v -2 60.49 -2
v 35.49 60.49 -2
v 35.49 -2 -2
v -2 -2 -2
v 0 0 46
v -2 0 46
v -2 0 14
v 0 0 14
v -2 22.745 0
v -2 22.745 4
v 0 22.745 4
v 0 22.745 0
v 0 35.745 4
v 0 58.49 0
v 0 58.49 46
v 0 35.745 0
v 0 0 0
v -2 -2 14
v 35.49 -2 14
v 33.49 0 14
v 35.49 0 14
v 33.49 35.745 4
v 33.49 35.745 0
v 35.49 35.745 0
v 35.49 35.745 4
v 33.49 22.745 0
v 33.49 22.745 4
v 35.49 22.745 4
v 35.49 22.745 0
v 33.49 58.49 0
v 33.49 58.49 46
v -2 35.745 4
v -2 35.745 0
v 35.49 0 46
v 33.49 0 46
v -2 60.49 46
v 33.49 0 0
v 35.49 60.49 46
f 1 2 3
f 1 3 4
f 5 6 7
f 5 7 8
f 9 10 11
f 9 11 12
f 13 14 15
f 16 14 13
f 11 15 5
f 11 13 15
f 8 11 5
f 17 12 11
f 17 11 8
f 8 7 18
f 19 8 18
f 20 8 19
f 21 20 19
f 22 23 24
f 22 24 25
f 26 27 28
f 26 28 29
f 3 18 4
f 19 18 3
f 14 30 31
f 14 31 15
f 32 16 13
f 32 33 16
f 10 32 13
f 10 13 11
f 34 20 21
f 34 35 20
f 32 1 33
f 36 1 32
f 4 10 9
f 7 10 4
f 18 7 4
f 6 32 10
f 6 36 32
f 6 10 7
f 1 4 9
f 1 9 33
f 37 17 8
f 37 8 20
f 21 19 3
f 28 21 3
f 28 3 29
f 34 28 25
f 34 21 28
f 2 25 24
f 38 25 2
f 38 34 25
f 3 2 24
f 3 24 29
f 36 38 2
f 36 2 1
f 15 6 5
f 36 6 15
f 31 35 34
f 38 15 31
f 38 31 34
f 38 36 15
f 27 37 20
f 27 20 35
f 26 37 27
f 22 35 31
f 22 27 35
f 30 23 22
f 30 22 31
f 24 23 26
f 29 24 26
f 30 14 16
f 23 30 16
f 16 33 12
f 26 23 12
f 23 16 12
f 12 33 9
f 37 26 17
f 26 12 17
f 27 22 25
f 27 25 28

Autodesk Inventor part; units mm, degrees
ref_plane "YZ Plane" through (0, 0, 0) normal (1, 0, 0) x (0, 1, 0)
ref_plane "XZ Plane" through (0, 0, 0) normal (0, 1, 0) x (-1, 0, 0)
ref_plane "XY Plane" through (0, 0, 0) normal (0, 0, 1) x (1, 0, 0)
sketch "Sketch1" plane through (0, 0, 0) normal (0, 0, 1) x (1, 0, 0)
  line L0 (0, 0) -> (33.49, 0)
  line L1 (33.49, 0) -> (33.49, 58.49)
  line L2 (33.49, 58.49) -> (0, 58.49)
  line L3 (0, 58.49) -> (0, 0)
  line L4 (-2, 60.49) -> (35.49, 60.49)
  line L5 (35.49, 60.49) -> (35.49, -2)
  line L6 (35.49, -2) -> (-2, -2)
  line L7 (-2, -2) -> (-2, 60.49)
  dimension "d0" = 33.49
  dimension "d1" = 58.49
  dimension "d2" = 2
extrude "Extrusion1" add sketch "Sketch1" along normal blind 46
sketch "Sketch2" plane through (0, 0, 46) normal (0, 0, 1) x (1, 0, 0)
  line L0 (-2, 60.49) -> (-2, -2) projected
  line L1 (-2, 0) -> (35.49, 0)
  line L2 (35.49, -2) -> (35.49, 60.49) projected
  line L3 (-2, -2) -> (35.49, -2) projected
  line L4 (35.49, -2) -> (-2, -2)
  line L5 (-2, -2) -> (-2, 0)
  point P0 (0, 0)
extrude "Extrusion2" cut sketch "Sketch2" against normal blind 32
sketch "Sketch3" plane through (0, 0, 0) normal (0, 0, -1) x (-1, 0, 0)
  line L0 (-35.49, 60.49) -> (2, 60.49) projected
  line L1 (2, -2) -> (-35.49, -2) projected
  line L2 (-35.49, 60.49) -> (2, 60.49)
  line L3 (2, 60.49) -> (2, -2)
  line L4 (2, -2) -> (-35.49, -2)
  line L5 (-35.49, -2) -> (-35.49, 60.49)
  point P0 (0, 0)
extrude "Extrusion3" add sketch "Sketch3" along normal blind 2
sketch "Sketch4" plane through (-2, 0, 46) normal (-1, 0, 0) x (0, 0, 1)
  line L0 (-48, -2) -> (-48, 60.49) projected
  line L1 (-48, 35.745) -> (-42, 35.745)
  line L2 (-42, 35.745) -> (-42, 22.745)
  line L3 (-42, 22.745) -> (-48, 22.745)
  line L4 (-48, 60.49) -> (0, 60.49) projected
  line L5 (-46, 35.745) -> (-46, 22.745)
  point P0 (-46, 0)
  point P1 (-45, 22.745)
  point P2 (-45, 35.745)
  dimension "d10" = 6
  dimension "d11" = 13
  dimension "d12" = 24.745
  dimension "d13" = 2
extrude "Extrusion4" cut sketch "Sketch4" against normal up to surface (37.49 mm away) contours L5 L1 L2 L3
properties part number "Motor_Base_3"
